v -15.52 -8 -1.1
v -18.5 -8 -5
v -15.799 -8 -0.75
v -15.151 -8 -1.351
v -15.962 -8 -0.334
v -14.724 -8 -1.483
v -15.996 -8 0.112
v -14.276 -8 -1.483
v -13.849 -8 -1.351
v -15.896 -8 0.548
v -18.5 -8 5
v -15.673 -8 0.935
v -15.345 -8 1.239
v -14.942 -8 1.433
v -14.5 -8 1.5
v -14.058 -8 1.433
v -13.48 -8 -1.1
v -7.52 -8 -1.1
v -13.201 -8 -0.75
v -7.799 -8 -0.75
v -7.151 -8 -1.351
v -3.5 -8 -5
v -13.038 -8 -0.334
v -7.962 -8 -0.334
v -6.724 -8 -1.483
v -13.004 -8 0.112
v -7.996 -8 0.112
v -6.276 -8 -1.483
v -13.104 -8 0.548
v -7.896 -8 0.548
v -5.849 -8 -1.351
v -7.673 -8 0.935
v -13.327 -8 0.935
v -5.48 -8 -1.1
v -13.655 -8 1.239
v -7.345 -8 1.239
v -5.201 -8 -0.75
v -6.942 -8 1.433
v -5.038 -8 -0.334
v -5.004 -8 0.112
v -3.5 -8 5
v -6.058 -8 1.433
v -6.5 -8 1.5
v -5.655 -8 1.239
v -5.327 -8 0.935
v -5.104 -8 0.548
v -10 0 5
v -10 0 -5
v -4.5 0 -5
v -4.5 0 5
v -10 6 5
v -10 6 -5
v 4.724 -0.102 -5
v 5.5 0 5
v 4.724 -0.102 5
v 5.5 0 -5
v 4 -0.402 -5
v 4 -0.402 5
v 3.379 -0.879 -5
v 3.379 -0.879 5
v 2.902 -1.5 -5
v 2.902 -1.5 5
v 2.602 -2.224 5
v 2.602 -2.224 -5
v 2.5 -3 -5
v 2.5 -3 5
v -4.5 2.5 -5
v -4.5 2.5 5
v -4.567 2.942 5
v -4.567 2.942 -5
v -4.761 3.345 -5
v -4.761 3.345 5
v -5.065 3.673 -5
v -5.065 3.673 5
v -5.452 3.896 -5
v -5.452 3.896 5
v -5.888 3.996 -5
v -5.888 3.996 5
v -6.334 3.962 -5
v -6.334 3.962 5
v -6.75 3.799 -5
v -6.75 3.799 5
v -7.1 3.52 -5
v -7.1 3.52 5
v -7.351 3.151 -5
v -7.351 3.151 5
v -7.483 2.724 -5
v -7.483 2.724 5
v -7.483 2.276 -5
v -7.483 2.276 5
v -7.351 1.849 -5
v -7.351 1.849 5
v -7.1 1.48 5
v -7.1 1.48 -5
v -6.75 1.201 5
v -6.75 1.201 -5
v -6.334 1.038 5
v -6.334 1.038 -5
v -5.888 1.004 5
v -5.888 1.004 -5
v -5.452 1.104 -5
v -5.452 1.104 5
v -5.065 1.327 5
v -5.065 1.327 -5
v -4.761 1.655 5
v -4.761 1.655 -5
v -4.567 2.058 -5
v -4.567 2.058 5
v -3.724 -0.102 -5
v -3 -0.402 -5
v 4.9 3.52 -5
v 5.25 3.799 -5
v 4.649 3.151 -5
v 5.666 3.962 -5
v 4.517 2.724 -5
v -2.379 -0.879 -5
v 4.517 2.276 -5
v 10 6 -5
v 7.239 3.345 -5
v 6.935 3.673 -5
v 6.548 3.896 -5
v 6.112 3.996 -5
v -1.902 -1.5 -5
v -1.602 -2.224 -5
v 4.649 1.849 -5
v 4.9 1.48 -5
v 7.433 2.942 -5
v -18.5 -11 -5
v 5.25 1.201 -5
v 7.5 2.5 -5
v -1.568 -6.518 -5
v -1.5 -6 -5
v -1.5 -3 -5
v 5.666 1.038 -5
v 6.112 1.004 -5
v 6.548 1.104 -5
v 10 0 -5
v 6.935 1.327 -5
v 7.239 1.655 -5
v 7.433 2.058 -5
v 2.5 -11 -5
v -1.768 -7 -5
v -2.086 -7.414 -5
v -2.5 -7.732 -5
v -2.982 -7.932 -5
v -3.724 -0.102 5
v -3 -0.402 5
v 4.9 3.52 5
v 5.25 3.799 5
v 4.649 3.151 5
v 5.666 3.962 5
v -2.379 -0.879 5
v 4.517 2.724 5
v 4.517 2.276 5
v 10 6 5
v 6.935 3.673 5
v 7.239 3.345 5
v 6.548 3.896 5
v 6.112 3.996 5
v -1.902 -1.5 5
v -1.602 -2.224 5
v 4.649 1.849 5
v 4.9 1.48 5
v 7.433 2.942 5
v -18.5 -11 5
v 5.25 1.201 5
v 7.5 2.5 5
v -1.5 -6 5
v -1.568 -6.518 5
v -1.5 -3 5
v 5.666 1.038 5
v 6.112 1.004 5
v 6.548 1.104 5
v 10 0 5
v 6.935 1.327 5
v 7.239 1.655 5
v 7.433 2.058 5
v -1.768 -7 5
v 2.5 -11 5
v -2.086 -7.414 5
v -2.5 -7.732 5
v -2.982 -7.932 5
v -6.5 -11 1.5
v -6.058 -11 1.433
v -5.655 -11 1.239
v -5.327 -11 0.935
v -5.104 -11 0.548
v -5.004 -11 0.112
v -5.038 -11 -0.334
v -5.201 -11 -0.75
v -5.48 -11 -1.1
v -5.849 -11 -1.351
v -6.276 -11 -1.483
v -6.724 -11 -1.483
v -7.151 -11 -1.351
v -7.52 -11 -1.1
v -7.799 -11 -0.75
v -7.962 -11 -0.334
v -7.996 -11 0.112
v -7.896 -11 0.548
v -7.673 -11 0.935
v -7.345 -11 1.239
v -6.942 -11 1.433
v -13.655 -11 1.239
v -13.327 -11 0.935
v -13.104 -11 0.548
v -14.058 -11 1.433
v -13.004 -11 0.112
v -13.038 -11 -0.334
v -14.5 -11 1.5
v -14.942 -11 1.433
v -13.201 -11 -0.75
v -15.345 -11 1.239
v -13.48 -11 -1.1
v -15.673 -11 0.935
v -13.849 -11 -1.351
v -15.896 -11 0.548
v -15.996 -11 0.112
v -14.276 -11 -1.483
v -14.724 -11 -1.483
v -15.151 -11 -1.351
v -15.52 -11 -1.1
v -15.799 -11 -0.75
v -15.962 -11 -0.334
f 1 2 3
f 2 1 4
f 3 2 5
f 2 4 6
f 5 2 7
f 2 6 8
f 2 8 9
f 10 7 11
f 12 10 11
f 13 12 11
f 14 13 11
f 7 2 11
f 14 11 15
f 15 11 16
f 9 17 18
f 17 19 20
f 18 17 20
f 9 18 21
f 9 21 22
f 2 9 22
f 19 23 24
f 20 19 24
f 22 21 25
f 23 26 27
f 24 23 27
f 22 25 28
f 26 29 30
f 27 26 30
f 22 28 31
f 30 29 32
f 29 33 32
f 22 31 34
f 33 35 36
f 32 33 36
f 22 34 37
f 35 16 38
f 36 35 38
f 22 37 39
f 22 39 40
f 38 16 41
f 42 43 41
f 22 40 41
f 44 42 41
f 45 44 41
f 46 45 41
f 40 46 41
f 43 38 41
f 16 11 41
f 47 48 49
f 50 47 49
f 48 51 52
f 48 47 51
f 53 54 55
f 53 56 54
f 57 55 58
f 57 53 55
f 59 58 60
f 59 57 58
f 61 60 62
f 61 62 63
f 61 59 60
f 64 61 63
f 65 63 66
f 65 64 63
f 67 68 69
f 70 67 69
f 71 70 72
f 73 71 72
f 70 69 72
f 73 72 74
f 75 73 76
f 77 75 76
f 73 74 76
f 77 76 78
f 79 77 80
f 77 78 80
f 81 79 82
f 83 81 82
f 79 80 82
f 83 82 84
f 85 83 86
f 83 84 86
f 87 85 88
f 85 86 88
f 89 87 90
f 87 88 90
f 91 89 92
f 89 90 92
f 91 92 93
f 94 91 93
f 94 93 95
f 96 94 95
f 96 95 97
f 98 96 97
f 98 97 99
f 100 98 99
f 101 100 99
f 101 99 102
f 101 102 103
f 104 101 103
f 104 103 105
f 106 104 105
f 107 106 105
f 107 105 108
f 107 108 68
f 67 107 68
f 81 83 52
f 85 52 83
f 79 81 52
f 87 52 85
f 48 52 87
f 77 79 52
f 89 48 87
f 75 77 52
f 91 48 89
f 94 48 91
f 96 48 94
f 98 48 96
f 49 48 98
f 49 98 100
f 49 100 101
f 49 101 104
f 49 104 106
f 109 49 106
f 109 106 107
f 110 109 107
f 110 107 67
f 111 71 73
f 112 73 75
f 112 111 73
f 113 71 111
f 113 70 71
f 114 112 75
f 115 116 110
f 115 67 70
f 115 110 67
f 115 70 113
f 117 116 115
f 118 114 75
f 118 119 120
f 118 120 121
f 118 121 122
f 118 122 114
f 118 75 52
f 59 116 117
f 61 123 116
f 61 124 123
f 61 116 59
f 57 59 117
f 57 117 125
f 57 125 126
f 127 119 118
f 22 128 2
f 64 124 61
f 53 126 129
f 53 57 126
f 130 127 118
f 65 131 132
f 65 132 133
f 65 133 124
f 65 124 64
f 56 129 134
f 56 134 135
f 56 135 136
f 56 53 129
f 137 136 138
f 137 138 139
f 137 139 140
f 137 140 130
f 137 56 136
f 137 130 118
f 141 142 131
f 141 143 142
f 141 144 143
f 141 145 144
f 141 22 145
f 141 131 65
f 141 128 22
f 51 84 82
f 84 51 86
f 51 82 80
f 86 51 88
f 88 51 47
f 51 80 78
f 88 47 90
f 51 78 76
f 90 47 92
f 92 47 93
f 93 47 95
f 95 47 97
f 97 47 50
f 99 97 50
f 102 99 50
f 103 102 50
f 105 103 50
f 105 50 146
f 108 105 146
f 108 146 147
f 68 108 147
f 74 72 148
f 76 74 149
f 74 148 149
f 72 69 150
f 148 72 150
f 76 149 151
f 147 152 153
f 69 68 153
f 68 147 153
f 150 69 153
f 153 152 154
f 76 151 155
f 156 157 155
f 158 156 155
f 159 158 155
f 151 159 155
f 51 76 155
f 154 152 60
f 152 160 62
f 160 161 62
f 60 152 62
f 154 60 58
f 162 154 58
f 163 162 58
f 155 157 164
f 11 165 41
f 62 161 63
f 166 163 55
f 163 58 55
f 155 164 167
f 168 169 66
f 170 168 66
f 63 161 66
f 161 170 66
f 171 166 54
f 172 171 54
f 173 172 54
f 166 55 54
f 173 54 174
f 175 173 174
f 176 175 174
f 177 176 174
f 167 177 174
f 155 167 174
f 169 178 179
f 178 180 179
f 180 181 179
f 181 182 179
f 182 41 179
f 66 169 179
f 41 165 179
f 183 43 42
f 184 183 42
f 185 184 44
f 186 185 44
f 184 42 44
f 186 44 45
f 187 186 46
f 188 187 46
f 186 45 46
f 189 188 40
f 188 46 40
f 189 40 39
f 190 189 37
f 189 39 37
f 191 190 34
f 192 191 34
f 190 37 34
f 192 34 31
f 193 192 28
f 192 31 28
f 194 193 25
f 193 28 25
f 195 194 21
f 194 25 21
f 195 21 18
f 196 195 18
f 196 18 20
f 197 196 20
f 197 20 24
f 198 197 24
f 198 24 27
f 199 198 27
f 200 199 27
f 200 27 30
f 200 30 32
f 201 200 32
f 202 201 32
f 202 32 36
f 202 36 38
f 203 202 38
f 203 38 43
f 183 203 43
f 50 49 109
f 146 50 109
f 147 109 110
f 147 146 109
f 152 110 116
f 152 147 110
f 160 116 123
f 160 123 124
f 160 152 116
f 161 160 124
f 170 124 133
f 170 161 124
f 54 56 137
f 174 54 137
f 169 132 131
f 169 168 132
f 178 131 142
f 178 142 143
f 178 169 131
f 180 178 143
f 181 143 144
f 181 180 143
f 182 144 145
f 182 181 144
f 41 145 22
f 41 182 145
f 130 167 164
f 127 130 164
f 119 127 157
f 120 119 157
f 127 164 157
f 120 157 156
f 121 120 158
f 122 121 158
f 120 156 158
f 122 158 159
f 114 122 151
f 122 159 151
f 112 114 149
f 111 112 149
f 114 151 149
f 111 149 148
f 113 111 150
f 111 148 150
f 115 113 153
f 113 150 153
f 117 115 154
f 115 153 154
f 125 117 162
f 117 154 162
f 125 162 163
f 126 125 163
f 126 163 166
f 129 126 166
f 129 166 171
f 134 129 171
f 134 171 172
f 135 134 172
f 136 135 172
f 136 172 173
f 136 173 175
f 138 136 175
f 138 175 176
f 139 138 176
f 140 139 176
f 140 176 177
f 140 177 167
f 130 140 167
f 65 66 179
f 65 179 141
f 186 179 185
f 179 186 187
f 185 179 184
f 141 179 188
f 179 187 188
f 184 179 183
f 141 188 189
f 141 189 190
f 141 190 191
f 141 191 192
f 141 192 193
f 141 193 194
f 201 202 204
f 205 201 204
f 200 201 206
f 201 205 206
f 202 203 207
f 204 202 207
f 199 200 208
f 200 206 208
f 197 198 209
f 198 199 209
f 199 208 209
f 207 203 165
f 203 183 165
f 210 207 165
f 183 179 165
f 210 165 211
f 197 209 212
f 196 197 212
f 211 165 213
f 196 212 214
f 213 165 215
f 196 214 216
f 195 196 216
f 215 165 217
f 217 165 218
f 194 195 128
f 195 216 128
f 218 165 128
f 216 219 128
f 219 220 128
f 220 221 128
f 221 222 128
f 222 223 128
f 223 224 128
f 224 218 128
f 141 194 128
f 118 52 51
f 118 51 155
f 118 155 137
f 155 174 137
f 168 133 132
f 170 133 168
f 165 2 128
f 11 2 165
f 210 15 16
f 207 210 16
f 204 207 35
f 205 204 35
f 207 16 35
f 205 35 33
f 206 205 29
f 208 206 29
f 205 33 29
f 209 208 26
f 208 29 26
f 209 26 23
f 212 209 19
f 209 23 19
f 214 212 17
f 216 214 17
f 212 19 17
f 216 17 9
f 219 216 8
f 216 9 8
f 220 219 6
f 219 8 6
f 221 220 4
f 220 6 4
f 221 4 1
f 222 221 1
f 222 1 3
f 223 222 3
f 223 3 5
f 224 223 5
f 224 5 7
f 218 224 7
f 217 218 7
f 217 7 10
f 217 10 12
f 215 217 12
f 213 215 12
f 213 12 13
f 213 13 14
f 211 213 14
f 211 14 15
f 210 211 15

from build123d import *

# Parameters (mm, degrees)
SKETCH_1_W          = 20
SKETCH_1_H          = 10
EXTRUDE_1_DEPTH     = 5
SKETCH_2_R          = 1.5
CUT_EXTRUDE_1_DEPTH = 16
SKETCH_3_W          = 3
SKETCH_3_H          = 10
EXTRUDE_2_DEPTH     = 8
SKETCH_6_W          = 20
SKETCH_6_H          = 10
EXTRUDE_4_DEPTH     = 3
SKETCH_7_R          = 1.5
CUT_EXTRUDE_3_DEPTH = 24.157072354
FILLET_2_R          = 3
FILLET_4_R          = 2
SKETCH_11_W         = 10
SKETCH_11_H         = 11
EXTRUDE_7_DEPTH     = 1
FILLET_8_R          = 3
SKETCH_12_W         = 20
SKETCH_12_H         = 10
EXTRUDE_8_DEPTH     = 1


with BuildPart() as part:
    # 草图1 → 凸台-拉伸1 (new body)
    with BuildSketch(Plane(origin=(0, 0, 0), x_dir=(1, 0, 0), z_dir=(0, 1, 0))):
        Rectangle(SKETCH_1_W, SKETCH_1_H)
    extrude(amount=EXTRUDE_1_DEPTH)

    # 草图2 → 切除-拉伸1 (cut, through all)
    with BuildSketch(Plane.XY.offset(5)):
        with Locations((-6, 2.5)):
            Circle(SKETCH_2_R)
        with Locations((6, 2.5)):
            Circle(SKETCH_2_R)
    extrude(amount=-CUT_EXTRUDE_1_DEPTH, mode=Mode.SUBTRACT)

    # 草图3 → 凸台-拉伸2 (add)
    with BuildSketch(Plane.XZ):
        Rectangle(SKETCH_3_W, SKETCH_3_H)
    extrude(amount=EXTRUDE_2_DEPTH)

    # 草图6 → 凸台-拉伸4 (add)
    with BuildSketch(Plane.XZ.offset(8)):
        with Locations((-8.5, 0)):
            Rectangle(SKETCH_6_W, SKETCH_6_H)
    extrude(amount=EXTRUDE_4_DEPTH)

    # 草图7 → 切除-拉伸3 (cut, through all)
    with BuildSketch(Plane(origin=(0, -8, 0), x_dir=(1, 0, 0), z_dir=(0, 1, 0))):
        with Locations(Location((-14.5, 0, 0), (0, 0, 270))):
            Circle(SKETCH_7_R)
        with Locations(Location((-6.5, 0, 0), (0, 0, 270))):
            Circle(SKETCH_7_R)
    extrude(amount=-CUT_EXTRUDE_3_DEPTH, mode=Mode.SUBTRACT)

    # 圆角2
    fillet_2_edges = [part.edges().sort_by_distance(p)[0] for p in [
        (-1.5, 0, 0),
    ]]
    fillet(fillet_2_edges, radius=FILLET_2_R)

    # 圆角4
    fillet_4_edges = [part.edges().sort_by_distance(p)[0] for p in [
        (-1.5, -8, 0),
    ]]
    fillet(fillet_4_edges, radius=FILLET_4_R)

    # 草图11 → 凸台-拉伸7 (add)
    with BuildSketch(Plane(origin=(1.5, 0, 0), x_dir=(0, 0, -1), z_dir=(1, 0, 0))):
        with Locations((0, -5.5)):
            Rectangle(SKETCH_11_W, SKETCH_11_H)
    extrude(amount=EXTRUDE_7_DEPTH)

    # 圆角8
    fillet_8_edges = [part.edges().sort_by_distance(p)[0] for p in [
        (2.5, 0, 0),
    ]]
    fillet(fillet_8_edges, radius=FILLET_8_R)

    # 草图12 → 凸台-拉伸8 (add)
    with BuildSketch(Plane(origin=(0, 5, 0), x_dir=(1, 0, 0), z_dir=(0, 1, 0))):
        Rectangle(SKETCH_12_W, SKETCH_12_H)
    extrude(amount=EXTRUDE_8_DEPTH)


solid = part.part
